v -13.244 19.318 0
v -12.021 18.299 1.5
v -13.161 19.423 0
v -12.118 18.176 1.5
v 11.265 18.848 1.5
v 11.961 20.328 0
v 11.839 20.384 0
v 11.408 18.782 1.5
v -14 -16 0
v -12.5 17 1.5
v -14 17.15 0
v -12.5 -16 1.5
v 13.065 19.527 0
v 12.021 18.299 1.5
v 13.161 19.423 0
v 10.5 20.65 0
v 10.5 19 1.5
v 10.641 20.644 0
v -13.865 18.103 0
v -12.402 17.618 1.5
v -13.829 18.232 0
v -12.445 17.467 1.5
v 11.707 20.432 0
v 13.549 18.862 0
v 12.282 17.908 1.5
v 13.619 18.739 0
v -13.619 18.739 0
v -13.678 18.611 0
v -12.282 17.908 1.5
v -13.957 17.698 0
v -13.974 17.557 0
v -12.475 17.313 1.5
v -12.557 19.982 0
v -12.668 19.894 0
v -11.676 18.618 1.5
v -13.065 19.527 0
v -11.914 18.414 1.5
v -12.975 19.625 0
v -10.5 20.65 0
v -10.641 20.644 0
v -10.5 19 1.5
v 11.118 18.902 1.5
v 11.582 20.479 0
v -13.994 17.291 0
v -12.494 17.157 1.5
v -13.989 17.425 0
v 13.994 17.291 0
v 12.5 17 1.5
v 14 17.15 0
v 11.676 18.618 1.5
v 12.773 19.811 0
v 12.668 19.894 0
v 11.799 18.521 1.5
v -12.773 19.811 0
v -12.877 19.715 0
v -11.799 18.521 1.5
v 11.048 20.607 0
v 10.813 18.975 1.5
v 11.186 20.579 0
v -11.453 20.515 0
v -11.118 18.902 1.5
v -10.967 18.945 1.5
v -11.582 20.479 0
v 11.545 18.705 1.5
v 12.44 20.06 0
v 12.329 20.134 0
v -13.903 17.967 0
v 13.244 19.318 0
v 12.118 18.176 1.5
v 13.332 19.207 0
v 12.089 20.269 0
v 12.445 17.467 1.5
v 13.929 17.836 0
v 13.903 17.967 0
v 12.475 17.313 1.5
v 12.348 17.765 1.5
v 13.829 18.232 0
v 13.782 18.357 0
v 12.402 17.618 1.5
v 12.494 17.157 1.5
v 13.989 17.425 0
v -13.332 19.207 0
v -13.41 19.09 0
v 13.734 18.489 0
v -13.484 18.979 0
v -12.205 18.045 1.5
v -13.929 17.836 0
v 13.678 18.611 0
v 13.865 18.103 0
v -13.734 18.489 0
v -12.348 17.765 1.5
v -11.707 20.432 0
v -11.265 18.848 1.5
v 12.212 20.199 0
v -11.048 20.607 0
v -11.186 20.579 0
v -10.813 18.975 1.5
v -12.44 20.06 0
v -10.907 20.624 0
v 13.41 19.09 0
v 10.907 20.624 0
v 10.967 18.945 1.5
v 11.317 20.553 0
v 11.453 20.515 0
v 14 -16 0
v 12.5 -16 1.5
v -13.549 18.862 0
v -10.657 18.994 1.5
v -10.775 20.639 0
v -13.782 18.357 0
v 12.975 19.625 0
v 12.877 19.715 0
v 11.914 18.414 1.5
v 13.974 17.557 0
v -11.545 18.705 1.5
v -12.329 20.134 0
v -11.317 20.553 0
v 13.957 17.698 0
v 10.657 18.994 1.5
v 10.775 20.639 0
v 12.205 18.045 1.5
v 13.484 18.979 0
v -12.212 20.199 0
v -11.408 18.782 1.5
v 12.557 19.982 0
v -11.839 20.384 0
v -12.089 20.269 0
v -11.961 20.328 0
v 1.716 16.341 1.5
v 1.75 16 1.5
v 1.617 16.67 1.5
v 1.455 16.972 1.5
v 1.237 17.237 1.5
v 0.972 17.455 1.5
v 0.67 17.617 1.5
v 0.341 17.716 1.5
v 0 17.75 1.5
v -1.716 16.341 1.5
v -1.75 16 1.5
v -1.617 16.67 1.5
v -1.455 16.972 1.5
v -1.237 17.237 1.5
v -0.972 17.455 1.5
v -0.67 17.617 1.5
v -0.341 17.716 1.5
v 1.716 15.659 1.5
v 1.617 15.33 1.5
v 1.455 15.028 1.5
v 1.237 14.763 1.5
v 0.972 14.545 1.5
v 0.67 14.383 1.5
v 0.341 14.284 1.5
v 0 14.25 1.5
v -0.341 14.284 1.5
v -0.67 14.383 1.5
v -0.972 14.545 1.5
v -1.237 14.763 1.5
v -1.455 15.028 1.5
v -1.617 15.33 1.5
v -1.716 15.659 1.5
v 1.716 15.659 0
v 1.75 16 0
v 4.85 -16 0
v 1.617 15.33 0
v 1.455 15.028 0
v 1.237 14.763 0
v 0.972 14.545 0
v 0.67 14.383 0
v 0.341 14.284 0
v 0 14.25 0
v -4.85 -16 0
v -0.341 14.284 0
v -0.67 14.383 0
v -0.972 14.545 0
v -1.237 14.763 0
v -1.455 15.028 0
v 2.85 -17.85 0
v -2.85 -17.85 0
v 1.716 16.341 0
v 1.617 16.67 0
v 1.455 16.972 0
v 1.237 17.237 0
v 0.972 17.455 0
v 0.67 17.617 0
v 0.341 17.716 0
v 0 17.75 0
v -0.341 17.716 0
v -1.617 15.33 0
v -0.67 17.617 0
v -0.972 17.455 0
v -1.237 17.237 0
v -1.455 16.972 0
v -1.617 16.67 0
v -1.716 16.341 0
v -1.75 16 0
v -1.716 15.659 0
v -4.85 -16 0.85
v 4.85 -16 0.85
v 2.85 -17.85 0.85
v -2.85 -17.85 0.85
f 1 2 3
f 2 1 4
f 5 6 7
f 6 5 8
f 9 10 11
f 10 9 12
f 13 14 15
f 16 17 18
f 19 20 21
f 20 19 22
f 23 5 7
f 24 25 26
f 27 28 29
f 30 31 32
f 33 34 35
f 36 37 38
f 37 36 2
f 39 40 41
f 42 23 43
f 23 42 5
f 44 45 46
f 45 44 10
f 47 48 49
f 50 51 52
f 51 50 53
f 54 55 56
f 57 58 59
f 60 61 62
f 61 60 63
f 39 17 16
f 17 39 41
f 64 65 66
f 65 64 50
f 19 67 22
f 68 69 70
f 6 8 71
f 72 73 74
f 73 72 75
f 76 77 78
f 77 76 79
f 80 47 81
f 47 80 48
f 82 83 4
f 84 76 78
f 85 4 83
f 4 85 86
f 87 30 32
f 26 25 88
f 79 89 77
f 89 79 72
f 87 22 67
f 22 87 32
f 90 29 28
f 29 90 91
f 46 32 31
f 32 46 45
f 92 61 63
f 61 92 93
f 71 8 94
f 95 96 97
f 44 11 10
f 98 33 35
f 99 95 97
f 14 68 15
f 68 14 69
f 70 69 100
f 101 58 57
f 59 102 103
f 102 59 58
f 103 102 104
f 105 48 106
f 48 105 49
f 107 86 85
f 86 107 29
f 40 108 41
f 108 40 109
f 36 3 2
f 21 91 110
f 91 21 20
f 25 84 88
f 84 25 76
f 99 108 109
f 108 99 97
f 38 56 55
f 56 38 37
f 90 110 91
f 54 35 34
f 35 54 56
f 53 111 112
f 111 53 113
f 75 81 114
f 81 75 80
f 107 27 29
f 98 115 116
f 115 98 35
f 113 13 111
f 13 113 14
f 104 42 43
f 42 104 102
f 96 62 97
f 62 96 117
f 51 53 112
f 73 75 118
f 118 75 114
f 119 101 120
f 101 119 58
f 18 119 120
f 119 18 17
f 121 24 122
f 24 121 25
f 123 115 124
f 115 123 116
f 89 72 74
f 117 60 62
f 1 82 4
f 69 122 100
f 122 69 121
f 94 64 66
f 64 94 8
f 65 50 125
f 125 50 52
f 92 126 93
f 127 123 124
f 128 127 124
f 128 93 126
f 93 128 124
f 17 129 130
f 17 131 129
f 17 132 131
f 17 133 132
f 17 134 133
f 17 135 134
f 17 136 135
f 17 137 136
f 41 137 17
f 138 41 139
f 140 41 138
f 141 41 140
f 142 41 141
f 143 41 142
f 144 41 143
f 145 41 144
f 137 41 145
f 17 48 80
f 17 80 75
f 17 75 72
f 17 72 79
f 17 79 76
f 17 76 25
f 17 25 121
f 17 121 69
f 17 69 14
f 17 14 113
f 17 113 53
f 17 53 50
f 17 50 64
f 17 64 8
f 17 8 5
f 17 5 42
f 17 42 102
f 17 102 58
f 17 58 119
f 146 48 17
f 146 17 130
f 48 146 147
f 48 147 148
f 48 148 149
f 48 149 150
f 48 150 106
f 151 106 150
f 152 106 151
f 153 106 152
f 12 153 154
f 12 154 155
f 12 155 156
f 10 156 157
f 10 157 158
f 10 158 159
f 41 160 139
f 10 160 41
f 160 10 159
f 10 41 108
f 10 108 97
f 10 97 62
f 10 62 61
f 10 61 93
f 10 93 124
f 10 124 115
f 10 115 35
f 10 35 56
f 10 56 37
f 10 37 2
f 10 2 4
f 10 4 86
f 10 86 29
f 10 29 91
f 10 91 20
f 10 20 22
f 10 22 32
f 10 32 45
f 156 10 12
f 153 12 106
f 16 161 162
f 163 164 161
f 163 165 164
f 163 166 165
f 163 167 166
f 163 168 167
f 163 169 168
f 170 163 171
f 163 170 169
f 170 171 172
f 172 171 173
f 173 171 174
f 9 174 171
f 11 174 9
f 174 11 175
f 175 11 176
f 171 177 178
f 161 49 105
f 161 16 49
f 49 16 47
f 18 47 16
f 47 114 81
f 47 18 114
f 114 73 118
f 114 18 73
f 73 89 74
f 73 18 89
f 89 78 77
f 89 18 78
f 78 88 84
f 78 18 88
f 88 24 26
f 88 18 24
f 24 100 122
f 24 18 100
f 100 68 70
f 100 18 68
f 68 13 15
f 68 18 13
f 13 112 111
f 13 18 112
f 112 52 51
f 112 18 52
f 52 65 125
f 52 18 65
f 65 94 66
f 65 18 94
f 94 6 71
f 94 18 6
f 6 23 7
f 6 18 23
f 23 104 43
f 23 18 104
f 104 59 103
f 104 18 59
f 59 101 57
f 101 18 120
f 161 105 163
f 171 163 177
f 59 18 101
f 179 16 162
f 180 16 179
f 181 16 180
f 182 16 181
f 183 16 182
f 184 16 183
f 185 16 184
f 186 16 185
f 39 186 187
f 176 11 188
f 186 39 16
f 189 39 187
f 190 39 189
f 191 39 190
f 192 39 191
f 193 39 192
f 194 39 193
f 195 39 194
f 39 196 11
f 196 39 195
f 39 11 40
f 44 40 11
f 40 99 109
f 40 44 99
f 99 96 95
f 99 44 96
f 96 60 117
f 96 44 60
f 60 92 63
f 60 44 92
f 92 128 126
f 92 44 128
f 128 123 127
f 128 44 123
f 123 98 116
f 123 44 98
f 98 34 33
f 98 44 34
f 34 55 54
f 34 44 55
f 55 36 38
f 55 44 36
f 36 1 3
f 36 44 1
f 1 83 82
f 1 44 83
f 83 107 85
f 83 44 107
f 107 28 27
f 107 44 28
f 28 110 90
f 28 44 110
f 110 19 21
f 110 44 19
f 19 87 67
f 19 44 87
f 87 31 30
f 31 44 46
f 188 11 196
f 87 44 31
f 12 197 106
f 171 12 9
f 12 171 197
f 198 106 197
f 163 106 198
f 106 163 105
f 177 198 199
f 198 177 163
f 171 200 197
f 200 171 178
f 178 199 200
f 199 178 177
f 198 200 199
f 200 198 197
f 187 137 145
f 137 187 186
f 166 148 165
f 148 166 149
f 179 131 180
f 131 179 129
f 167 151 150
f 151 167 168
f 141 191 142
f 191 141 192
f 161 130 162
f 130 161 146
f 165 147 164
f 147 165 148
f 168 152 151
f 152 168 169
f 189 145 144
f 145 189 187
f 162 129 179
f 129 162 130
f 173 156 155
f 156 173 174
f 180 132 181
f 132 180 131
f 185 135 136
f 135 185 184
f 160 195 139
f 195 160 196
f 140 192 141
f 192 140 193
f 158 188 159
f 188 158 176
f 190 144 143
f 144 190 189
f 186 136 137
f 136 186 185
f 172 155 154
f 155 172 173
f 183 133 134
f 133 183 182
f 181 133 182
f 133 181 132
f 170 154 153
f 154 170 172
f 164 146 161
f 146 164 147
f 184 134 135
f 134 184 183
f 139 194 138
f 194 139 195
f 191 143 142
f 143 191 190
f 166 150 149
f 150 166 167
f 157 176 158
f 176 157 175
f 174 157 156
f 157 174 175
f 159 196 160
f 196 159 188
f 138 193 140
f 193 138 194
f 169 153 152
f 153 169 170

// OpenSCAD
include <../../variables.scad>

use <Round-Anything/polyround.scad>
use <MainCase.scad>

// This is nicely defined in MainCase.scad, as it is basically cutting
// something out of the antenna housing. So we just import it and use it in
// this file to get a standalone output file.
GpsAntennaLid();
